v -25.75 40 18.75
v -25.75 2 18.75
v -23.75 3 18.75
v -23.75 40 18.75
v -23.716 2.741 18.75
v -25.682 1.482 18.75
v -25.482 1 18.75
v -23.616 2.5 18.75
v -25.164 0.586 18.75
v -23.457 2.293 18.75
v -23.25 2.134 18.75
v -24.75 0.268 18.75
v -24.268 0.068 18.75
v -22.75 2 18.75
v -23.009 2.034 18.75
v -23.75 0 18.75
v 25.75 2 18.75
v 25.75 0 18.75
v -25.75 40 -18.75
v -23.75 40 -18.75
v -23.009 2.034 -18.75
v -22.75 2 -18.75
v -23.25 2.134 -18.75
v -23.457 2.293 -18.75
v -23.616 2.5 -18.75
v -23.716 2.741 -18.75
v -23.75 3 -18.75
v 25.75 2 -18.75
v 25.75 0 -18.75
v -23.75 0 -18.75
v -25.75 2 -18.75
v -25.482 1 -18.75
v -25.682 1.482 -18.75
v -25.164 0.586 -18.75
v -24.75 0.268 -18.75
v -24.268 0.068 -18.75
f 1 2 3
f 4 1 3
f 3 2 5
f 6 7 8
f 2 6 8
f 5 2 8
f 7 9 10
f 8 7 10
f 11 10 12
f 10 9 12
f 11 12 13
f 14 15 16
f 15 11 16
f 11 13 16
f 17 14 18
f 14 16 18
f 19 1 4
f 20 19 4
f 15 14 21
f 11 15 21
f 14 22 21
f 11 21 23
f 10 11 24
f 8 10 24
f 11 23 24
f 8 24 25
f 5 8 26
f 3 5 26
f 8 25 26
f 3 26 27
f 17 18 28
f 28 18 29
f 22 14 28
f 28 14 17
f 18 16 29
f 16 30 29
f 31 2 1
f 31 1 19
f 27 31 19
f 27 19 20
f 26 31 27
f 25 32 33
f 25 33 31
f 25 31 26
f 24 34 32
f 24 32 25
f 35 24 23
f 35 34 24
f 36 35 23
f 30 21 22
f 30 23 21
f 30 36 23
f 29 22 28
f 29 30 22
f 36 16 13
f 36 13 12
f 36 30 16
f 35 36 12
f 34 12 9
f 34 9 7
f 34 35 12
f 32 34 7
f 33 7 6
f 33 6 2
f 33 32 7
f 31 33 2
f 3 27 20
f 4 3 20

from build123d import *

# Parameters (mm, degrees)
SKETCH1_W           = 51.5
SKETCH1_H           = 37.5
BOSS_EXTRUDE1_DEPTH = 40
SKETCH2_W           = 49.5
SKETCH2_H           = 38
CUT_EXTRUDE1_DEPTH  = 38.5
FILLET1_R           = 1
FILLET2_R           = 2


with BuildPart() as part:
    # Sketch1 → Boss-Extrude1 (new body)
    with BuildSketch(Plane(origin=(0, 0, 0), x_dir=(1, 0, 0), z_dir=(0, 1, 0))):
        Rectangle(SKETCH1_W, SKETCH1_H)
    extrude(amount=BOSS_EXTRUDE1_DEPTH)

    # Sketch2 → Cut-Extrude1 (cut, through all)
    with BuildSketch(Plane.XY.offset(18.75)):
        with Locations((1, 21)):
            Rectangle(SKETCH2_W, SKETCH2_H)
    extrude(amount=-CUT_EXTRUDE1_DEPTH, mode=Mode.SUBTRACT)

    # Fillet1
    fillet1_edges = [part.edges().sort_by_distance(p)[0] for p in [
        (-23.75, 2, 0),
    ]]
    fillet(fillet1_edges, radius=FILLET1_R)

    # Fillet2
    fillet2_edges = [part.edges().sort_by_distance(p)[0] for p in [
        (-25.75, 0, 0),
    ]]
    fillet(fillet2_edges, radius=FILLET2_R)


solid = part.part
